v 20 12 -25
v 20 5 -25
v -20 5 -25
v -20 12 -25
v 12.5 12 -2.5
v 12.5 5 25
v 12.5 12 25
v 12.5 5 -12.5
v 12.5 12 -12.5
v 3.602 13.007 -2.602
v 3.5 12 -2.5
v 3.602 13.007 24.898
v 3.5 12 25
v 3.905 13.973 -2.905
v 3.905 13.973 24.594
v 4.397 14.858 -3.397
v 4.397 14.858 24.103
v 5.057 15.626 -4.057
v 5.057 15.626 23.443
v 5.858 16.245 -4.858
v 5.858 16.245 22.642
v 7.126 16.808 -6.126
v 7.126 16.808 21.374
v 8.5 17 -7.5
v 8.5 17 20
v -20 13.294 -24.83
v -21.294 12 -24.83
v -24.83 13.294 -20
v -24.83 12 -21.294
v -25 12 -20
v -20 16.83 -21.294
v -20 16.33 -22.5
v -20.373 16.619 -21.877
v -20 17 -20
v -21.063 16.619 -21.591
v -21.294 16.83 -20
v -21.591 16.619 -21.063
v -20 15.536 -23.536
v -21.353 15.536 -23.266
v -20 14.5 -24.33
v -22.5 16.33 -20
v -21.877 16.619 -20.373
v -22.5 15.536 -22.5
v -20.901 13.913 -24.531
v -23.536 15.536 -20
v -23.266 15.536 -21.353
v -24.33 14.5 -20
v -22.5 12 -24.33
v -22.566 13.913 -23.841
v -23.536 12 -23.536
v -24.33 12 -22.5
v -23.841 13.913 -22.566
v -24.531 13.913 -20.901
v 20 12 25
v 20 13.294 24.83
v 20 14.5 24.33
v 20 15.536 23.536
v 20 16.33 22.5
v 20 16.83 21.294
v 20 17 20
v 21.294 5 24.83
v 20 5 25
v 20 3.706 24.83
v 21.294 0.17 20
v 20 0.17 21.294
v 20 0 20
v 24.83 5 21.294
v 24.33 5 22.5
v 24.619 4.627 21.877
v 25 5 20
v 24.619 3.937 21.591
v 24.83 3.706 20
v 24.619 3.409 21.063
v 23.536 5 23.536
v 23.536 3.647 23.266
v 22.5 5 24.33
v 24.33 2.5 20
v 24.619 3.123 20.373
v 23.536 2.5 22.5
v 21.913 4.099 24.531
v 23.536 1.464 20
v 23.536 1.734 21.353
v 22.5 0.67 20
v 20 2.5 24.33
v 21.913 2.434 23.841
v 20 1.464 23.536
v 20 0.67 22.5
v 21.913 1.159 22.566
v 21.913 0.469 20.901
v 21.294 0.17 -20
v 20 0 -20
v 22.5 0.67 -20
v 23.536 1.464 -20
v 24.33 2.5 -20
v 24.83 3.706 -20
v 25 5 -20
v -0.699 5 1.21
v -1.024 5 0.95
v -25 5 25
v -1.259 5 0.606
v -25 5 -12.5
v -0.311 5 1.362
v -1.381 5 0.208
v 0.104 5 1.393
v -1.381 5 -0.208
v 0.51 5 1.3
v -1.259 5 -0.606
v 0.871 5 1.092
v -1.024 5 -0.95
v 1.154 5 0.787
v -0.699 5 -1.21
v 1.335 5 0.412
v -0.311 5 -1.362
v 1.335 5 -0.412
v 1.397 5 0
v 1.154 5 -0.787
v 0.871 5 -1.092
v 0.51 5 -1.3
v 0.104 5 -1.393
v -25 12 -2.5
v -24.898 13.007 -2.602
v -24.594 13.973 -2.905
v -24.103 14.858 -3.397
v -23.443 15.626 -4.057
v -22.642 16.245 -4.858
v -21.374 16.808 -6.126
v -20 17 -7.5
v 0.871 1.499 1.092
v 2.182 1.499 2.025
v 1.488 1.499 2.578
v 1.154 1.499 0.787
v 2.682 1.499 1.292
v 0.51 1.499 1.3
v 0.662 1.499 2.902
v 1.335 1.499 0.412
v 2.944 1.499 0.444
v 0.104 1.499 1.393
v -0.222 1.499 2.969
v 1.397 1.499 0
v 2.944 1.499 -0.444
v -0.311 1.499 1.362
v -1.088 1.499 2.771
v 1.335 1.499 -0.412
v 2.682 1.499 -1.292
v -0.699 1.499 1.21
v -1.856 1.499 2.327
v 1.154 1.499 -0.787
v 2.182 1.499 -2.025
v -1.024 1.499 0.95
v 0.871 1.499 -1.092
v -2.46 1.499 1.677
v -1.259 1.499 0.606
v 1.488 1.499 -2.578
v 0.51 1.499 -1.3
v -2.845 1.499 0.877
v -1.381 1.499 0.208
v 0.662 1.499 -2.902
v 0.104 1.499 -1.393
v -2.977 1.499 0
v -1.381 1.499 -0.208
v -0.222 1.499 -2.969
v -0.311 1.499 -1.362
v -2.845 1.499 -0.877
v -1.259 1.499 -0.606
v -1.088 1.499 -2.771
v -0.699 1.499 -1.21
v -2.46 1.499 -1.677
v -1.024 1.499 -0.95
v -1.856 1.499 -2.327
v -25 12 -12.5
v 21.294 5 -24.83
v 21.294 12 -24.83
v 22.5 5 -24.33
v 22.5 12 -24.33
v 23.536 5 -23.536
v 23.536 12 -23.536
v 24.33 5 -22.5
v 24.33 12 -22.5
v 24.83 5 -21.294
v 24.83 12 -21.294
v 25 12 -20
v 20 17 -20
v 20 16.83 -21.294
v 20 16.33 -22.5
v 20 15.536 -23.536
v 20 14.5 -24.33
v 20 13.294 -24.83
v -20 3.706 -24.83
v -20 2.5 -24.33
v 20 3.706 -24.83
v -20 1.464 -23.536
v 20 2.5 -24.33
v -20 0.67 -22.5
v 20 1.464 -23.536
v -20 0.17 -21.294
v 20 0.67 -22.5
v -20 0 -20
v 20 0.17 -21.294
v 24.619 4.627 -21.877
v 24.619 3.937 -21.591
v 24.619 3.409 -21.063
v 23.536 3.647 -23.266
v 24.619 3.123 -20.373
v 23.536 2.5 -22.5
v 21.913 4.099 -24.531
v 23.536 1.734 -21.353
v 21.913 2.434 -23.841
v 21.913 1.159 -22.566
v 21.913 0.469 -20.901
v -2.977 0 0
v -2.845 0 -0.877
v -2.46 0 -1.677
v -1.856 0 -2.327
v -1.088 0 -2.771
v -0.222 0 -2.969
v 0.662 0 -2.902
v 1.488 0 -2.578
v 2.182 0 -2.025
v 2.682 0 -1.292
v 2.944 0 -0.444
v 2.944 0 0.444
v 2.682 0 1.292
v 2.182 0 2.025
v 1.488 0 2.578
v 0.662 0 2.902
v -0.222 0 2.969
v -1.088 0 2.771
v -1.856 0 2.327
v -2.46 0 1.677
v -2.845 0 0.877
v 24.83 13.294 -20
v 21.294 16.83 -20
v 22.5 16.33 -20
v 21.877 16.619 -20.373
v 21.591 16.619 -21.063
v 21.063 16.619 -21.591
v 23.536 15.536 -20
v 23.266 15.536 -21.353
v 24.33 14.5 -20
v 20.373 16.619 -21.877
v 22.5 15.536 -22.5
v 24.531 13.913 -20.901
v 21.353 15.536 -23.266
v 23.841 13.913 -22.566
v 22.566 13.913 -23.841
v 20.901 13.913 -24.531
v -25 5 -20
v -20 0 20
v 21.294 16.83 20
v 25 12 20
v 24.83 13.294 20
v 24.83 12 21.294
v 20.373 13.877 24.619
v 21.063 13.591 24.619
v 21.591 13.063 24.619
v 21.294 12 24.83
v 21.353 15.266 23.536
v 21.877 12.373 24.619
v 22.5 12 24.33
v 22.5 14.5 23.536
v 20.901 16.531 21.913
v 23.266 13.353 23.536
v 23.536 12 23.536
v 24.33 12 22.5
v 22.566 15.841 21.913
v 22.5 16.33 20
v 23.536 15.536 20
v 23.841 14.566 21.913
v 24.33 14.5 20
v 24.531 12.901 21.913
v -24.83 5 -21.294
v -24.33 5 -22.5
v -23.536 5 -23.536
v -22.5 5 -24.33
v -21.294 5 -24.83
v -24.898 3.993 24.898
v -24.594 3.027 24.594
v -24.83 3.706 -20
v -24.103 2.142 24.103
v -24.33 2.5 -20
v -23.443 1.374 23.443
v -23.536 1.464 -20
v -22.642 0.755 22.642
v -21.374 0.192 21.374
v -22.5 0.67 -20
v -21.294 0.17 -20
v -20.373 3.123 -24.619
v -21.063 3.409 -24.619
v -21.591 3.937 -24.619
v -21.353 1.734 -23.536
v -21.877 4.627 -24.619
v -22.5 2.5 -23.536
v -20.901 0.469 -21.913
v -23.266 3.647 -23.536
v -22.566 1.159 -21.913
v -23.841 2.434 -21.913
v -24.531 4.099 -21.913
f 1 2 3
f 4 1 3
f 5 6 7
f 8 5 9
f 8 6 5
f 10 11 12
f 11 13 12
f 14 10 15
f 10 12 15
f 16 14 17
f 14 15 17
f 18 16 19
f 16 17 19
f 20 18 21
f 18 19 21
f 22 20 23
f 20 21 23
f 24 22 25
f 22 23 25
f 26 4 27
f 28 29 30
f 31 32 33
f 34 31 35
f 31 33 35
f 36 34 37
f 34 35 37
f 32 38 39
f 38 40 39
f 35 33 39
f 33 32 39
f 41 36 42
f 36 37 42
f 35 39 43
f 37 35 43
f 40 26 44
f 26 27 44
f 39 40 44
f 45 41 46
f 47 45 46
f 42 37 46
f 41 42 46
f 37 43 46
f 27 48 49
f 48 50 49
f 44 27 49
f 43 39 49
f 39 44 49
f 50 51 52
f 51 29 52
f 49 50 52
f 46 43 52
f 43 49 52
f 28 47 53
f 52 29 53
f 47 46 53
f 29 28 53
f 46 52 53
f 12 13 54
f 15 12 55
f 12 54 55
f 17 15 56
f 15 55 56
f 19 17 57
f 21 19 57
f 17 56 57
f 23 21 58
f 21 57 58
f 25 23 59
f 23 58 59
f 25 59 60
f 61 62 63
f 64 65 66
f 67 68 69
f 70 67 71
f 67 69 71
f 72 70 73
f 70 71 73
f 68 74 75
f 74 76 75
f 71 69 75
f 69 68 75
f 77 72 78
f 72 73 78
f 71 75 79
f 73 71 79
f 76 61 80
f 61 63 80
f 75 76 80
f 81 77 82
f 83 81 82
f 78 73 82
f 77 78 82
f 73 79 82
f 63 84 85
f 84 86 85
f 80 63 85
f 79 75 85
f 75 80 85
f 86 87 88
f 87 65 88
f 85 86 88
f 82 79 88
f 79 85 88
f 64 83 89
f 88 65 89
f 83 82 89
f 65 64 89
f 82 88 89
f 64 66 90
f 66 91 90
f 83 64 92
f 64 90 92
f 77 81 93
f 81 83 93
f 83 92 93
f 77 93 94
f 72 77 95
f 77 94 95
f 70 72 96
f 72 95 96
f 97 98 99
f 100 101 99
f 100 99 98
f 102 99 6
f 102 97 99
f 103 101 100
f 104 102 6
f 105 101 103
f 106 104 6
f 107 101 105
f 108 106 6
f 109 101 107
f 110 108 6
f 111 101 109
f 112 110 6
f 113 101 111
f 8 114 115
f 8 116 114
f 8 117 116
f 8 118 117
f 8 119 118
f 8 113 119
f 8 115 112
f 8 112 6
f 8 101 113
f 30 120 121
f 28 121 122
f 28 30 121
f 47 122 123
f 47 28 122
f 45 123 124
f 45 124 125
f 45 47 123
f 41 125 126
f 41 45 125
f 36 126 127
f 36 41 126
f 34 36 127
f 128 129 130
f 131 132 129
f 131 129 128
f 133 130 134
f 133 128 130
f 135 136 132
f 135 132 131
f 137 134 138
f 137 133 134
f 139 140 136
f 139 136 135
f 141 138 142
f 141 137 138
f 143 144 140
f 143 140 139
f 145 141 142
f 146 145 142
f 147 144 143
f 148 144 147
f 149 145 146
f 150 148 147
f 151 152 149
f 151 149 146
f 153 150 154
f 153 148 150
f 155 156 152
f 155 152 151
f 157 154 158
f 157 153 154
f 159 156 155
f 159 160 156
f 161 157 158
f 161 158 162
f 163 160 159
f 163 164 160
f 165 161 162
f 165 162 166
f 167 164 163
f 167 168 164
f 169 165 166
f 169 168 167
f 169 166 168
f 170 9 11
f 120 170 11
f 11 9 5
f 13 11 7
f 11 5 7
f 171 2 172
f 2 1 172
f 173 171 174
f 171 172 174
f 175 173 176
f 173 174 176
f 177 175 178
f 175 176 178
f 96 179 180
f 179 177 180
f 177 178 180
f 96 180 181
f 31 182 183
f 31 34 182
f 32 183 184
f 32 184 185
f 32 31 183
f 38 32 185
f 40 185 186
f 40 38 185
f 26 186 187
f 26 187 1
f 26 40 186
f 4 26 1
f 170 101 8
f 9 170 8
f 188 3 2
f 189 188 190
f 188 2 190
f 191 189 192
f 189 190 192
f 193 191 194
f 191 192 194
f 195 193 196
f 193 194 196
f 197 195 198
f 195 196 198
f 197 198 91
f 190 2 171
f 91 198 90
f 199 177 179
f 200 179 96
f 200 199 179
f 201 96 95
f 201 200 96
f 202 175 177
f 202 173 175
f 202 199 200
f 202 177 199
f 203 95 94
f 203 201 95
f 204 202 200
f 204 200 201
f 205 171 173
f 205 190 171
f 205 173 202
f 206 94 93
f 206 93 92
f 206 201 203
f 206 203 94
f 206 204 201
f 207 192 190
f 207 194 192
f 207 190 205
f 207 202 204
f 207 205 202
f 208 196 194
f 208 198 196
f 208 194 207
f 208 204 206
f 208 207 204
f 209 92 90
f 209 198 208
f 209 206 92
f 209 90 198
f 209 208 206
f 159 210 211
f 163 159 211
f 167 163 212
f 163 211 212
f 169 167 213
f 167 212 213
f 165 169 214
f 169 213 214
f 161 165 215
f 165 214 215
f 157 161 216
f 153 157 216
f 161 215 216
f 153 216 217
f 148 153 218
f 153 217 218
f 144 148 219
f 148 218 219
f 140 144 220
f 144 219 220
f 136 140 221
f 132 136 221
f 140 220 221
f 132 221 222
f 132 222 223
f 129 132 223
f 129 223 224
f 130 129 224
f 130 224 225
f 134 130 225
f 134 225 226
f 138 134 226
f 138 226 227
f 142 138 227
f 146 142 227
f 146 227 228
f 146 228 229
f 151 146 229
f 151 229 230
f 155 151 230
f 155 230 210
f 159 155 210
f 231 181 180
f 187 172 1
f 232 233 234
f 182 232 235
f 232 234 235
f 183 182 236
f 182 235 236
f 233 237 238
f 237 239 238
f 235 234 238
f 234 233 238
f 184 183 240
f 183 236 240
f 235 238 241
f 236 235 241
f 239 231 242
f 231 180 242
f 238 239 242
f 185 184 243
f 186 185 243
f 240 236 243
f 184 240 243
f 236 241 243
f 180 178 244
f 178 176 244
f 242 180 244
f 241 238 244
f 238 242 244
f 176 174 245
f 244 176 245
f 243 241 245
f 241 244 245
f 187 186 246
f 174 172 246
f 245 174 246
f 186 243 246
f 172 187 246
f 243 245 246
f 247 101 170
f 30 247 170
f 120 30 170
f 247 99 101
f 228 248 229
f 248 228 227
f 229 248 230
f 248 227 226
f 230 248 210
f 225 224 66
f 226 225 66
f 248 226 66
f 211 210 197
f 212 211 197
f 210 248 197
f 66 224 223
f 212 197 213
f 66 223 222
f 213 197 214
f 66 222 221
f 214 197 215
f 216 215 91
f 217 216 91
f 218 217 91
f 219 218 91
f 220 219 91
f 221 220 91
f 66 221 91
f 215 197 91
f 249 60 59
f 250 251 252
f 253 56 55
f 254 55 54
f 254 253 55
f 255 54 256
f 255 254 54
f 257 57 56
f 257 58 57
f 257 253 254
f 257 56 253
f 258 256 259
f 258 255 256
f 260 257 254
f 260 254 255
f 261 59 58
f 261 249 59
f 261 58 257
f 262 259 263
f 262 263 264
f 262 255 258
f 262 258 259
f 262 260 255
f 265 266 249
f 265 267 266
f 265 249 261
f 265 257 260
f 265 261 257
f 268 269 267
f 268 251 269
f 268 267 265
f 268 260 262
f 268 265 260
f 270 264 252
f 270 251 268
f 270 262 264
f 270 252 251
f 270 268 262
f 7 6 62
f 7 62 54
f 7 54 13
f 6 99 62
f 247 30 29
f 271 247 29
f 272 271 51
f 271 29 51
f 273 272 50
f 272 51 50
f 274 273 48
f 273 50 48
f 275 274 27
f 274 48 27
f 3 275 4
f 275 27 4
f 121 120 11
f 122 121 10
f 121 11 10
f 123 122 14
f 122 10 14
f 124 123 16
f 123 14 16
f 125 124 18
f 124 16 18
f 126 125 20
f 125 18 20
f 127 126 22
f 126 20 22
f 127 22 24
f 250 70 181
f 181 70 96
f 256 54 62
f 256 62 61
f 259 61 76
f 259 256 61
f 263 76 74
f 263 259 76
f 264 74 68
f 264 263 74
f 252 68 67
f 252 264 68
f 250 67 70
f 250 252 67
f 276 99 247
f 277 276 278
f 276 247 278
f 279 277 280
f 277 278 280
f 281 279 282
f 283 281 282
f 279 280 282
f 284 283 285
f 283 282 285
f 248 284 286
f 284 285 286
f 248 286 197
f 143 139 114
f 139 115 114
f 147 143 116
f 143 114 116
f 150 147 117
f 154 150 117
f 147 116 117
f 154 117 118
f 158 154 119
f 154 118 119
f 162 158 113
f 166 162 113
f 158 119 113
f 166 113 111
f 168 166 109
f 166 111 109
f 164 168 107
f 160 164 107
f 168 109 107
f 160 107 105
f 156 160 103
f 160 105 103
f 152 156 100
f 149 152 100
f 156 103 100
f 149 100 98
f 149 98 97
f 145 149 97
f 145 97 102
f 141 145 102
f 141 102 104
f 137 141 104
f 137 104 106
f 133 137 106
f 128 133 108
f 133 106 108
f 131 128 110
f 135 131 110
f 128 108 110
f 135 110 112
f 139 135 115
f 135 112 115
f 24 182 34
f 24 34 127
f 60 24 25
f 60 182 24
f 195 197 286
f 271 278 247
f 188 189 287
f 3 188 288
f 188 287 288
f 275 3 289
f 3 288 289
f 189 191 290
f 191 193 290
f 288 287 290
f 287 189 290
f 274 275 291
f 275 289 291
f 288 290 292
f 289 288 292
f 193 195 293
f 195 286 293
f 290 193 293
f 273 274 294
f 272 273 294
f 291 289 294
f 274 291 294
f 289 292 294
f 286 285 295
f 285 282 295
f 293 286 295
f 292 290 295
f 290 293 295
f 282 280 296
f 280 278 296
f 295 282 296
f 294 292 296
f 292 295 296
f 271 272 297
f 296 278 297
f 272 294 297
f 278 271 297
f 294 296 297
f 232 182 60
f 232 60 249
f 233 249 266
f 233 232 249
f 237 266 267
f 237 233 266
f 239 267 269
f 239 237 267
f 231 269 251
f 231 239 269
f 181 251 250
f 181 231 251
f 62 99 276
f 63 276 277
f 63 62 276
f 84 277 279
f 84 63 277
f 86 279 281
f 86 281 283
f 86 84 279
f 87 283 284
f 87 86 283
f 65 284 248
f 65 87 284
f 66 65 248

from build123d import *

# Parameters (mm, degrees)
SKETCH1_W                                           = 50
SKETCH1_H                                           = 50
BOSS_EXTRUDE1_DEPTH                                 = 5
SKETCH3_W                                           = 37.499690969
SKETCH3_H                                           = 12.500309031
SKETCH3_W_2                                         = 12.500309031
SKETCH3_H_2                                         = 37.499690969
BOSS_EXTRUDE2_DEPTH                                 = 12
SKETCH5_W                                           = 37.499690969
SKETCH5_H                                           = 5
BOSS_EXTRUDE3_DEPTH                                 = 10
SKETCH6_W                                           = 27.499690969
SKETCH6_H                                           = 5
BOSS_EXTRUDE4_DEPTH                                 = 9
FILLET2_R                                           = 5
CBORE_FOR_3_BINDING_HEAD_MACHINE_SCREW1_D           = 2.794
CBORE_FOR_3_BINDING_HEAD_MACHINE_SCREW1_CBORE_D     = 5.95376
CBORE_FOR_3_BINDING_HEAD_MACHINE_SCREW1_CBORE_DEPTH = 1.4986


with BuildPart() as part:
    # Sketch1 → Boss-Extrude1 (new body)
    with BuildSketch(Plane(origin=(0, 0, 0), x_dir=(1, 0, 0), z_dir=(0, 1, 0))):
        Rectangle(SKETCH1_W, SKETCH1_H)
    extrude(amount=BOSS_EXTRUDE1_DEPTH)

    # Sketch3 → Boss-Extrude2 (add)
    with BuildSketch(Plane(origin=(0, 5, 0), x_dir=(1, 0, 0), z_dir=(0, 1, 0))):
        with Locations((-6.250154515, 18.749845484)):
            Rectangle(SKETCH3_W, SKETCH3_H)
        with Locations((18.749845484, 18.749845484)):
            Rectangle(SKETCH3_W_2, SKETCH3_H)
        with Locations((18.749845484, -6.250154515)):
            Rectangle(SKETCH3_W_2, SKETCH3_H_2)
    extrude(amount=BOSS_EXTRUDE2_DEPTH)

    # Sketch5 → Boss-Extrude3 (add)
    with BuildSketch(Plane.XY.offset(-12.499690969)):
        with Locations((-6.250154515, 14.5)):
            Rectangle(SKETCH5_W, SKETCH5_H)
    extrude(amount=BOSS_EXTRUDE3_DEPTH)

    # Sketch6 → Boss-Extrude4 (add)
    with BuildSketch(Plane.ZY.offset(-12.499690969)):
        with Locations((11.250154516, 14.5)):
            Rectangle(SKETCH6_W, SKETCH6_H)
    extrude(amount=BOSS_EXTRUDE4_DEPTH)

    # Fillet2
    fillet2_edges = [part.edges().sort_by_distance(p)[0] for p in [
        (0, 0, 25),
        (-25, 0, 0),
        (0, 0, -25),
        (25, 8.5, -25),
        (-25, 8.5, -25),
        (25, 17, 0),
        (0, 17, -25),
        (-25, 17, -13.749845484),
        (3.499690969, 17, 11.250154516),
        (-10.750154516, 17, -2.499690969),
        (14.249845484, 17, 25),
        (25, 8.5, 25),
        (25, 0, 0),
    ]]
    fillet(fillet2_edges, radius=FILLET2_R - 0.0001)  # a hair under: the kernel refuses the full size

    # CBORE for #3 Binding Head Machine Screw1 (through all)
    with Locations(Plane(origin=(0, 0, 0), x_dir=(-1, 0, 0), z_dir=(0, -1, 0))):
        with Locations((0, 0)):
            CounterBoreHole(CBORE_FOR_3_BINDING_HEAD_MACHINE_SCREW1_D / 2, CBORE_FOR_3_BINDING_HEAD_MACHINE_SCREW1_CBORE_D / 2, CBORE_FOR_3_BINDING_HEAD_MACHINE_SCREW1_CBORE_DEPTH)


solid = part.part
